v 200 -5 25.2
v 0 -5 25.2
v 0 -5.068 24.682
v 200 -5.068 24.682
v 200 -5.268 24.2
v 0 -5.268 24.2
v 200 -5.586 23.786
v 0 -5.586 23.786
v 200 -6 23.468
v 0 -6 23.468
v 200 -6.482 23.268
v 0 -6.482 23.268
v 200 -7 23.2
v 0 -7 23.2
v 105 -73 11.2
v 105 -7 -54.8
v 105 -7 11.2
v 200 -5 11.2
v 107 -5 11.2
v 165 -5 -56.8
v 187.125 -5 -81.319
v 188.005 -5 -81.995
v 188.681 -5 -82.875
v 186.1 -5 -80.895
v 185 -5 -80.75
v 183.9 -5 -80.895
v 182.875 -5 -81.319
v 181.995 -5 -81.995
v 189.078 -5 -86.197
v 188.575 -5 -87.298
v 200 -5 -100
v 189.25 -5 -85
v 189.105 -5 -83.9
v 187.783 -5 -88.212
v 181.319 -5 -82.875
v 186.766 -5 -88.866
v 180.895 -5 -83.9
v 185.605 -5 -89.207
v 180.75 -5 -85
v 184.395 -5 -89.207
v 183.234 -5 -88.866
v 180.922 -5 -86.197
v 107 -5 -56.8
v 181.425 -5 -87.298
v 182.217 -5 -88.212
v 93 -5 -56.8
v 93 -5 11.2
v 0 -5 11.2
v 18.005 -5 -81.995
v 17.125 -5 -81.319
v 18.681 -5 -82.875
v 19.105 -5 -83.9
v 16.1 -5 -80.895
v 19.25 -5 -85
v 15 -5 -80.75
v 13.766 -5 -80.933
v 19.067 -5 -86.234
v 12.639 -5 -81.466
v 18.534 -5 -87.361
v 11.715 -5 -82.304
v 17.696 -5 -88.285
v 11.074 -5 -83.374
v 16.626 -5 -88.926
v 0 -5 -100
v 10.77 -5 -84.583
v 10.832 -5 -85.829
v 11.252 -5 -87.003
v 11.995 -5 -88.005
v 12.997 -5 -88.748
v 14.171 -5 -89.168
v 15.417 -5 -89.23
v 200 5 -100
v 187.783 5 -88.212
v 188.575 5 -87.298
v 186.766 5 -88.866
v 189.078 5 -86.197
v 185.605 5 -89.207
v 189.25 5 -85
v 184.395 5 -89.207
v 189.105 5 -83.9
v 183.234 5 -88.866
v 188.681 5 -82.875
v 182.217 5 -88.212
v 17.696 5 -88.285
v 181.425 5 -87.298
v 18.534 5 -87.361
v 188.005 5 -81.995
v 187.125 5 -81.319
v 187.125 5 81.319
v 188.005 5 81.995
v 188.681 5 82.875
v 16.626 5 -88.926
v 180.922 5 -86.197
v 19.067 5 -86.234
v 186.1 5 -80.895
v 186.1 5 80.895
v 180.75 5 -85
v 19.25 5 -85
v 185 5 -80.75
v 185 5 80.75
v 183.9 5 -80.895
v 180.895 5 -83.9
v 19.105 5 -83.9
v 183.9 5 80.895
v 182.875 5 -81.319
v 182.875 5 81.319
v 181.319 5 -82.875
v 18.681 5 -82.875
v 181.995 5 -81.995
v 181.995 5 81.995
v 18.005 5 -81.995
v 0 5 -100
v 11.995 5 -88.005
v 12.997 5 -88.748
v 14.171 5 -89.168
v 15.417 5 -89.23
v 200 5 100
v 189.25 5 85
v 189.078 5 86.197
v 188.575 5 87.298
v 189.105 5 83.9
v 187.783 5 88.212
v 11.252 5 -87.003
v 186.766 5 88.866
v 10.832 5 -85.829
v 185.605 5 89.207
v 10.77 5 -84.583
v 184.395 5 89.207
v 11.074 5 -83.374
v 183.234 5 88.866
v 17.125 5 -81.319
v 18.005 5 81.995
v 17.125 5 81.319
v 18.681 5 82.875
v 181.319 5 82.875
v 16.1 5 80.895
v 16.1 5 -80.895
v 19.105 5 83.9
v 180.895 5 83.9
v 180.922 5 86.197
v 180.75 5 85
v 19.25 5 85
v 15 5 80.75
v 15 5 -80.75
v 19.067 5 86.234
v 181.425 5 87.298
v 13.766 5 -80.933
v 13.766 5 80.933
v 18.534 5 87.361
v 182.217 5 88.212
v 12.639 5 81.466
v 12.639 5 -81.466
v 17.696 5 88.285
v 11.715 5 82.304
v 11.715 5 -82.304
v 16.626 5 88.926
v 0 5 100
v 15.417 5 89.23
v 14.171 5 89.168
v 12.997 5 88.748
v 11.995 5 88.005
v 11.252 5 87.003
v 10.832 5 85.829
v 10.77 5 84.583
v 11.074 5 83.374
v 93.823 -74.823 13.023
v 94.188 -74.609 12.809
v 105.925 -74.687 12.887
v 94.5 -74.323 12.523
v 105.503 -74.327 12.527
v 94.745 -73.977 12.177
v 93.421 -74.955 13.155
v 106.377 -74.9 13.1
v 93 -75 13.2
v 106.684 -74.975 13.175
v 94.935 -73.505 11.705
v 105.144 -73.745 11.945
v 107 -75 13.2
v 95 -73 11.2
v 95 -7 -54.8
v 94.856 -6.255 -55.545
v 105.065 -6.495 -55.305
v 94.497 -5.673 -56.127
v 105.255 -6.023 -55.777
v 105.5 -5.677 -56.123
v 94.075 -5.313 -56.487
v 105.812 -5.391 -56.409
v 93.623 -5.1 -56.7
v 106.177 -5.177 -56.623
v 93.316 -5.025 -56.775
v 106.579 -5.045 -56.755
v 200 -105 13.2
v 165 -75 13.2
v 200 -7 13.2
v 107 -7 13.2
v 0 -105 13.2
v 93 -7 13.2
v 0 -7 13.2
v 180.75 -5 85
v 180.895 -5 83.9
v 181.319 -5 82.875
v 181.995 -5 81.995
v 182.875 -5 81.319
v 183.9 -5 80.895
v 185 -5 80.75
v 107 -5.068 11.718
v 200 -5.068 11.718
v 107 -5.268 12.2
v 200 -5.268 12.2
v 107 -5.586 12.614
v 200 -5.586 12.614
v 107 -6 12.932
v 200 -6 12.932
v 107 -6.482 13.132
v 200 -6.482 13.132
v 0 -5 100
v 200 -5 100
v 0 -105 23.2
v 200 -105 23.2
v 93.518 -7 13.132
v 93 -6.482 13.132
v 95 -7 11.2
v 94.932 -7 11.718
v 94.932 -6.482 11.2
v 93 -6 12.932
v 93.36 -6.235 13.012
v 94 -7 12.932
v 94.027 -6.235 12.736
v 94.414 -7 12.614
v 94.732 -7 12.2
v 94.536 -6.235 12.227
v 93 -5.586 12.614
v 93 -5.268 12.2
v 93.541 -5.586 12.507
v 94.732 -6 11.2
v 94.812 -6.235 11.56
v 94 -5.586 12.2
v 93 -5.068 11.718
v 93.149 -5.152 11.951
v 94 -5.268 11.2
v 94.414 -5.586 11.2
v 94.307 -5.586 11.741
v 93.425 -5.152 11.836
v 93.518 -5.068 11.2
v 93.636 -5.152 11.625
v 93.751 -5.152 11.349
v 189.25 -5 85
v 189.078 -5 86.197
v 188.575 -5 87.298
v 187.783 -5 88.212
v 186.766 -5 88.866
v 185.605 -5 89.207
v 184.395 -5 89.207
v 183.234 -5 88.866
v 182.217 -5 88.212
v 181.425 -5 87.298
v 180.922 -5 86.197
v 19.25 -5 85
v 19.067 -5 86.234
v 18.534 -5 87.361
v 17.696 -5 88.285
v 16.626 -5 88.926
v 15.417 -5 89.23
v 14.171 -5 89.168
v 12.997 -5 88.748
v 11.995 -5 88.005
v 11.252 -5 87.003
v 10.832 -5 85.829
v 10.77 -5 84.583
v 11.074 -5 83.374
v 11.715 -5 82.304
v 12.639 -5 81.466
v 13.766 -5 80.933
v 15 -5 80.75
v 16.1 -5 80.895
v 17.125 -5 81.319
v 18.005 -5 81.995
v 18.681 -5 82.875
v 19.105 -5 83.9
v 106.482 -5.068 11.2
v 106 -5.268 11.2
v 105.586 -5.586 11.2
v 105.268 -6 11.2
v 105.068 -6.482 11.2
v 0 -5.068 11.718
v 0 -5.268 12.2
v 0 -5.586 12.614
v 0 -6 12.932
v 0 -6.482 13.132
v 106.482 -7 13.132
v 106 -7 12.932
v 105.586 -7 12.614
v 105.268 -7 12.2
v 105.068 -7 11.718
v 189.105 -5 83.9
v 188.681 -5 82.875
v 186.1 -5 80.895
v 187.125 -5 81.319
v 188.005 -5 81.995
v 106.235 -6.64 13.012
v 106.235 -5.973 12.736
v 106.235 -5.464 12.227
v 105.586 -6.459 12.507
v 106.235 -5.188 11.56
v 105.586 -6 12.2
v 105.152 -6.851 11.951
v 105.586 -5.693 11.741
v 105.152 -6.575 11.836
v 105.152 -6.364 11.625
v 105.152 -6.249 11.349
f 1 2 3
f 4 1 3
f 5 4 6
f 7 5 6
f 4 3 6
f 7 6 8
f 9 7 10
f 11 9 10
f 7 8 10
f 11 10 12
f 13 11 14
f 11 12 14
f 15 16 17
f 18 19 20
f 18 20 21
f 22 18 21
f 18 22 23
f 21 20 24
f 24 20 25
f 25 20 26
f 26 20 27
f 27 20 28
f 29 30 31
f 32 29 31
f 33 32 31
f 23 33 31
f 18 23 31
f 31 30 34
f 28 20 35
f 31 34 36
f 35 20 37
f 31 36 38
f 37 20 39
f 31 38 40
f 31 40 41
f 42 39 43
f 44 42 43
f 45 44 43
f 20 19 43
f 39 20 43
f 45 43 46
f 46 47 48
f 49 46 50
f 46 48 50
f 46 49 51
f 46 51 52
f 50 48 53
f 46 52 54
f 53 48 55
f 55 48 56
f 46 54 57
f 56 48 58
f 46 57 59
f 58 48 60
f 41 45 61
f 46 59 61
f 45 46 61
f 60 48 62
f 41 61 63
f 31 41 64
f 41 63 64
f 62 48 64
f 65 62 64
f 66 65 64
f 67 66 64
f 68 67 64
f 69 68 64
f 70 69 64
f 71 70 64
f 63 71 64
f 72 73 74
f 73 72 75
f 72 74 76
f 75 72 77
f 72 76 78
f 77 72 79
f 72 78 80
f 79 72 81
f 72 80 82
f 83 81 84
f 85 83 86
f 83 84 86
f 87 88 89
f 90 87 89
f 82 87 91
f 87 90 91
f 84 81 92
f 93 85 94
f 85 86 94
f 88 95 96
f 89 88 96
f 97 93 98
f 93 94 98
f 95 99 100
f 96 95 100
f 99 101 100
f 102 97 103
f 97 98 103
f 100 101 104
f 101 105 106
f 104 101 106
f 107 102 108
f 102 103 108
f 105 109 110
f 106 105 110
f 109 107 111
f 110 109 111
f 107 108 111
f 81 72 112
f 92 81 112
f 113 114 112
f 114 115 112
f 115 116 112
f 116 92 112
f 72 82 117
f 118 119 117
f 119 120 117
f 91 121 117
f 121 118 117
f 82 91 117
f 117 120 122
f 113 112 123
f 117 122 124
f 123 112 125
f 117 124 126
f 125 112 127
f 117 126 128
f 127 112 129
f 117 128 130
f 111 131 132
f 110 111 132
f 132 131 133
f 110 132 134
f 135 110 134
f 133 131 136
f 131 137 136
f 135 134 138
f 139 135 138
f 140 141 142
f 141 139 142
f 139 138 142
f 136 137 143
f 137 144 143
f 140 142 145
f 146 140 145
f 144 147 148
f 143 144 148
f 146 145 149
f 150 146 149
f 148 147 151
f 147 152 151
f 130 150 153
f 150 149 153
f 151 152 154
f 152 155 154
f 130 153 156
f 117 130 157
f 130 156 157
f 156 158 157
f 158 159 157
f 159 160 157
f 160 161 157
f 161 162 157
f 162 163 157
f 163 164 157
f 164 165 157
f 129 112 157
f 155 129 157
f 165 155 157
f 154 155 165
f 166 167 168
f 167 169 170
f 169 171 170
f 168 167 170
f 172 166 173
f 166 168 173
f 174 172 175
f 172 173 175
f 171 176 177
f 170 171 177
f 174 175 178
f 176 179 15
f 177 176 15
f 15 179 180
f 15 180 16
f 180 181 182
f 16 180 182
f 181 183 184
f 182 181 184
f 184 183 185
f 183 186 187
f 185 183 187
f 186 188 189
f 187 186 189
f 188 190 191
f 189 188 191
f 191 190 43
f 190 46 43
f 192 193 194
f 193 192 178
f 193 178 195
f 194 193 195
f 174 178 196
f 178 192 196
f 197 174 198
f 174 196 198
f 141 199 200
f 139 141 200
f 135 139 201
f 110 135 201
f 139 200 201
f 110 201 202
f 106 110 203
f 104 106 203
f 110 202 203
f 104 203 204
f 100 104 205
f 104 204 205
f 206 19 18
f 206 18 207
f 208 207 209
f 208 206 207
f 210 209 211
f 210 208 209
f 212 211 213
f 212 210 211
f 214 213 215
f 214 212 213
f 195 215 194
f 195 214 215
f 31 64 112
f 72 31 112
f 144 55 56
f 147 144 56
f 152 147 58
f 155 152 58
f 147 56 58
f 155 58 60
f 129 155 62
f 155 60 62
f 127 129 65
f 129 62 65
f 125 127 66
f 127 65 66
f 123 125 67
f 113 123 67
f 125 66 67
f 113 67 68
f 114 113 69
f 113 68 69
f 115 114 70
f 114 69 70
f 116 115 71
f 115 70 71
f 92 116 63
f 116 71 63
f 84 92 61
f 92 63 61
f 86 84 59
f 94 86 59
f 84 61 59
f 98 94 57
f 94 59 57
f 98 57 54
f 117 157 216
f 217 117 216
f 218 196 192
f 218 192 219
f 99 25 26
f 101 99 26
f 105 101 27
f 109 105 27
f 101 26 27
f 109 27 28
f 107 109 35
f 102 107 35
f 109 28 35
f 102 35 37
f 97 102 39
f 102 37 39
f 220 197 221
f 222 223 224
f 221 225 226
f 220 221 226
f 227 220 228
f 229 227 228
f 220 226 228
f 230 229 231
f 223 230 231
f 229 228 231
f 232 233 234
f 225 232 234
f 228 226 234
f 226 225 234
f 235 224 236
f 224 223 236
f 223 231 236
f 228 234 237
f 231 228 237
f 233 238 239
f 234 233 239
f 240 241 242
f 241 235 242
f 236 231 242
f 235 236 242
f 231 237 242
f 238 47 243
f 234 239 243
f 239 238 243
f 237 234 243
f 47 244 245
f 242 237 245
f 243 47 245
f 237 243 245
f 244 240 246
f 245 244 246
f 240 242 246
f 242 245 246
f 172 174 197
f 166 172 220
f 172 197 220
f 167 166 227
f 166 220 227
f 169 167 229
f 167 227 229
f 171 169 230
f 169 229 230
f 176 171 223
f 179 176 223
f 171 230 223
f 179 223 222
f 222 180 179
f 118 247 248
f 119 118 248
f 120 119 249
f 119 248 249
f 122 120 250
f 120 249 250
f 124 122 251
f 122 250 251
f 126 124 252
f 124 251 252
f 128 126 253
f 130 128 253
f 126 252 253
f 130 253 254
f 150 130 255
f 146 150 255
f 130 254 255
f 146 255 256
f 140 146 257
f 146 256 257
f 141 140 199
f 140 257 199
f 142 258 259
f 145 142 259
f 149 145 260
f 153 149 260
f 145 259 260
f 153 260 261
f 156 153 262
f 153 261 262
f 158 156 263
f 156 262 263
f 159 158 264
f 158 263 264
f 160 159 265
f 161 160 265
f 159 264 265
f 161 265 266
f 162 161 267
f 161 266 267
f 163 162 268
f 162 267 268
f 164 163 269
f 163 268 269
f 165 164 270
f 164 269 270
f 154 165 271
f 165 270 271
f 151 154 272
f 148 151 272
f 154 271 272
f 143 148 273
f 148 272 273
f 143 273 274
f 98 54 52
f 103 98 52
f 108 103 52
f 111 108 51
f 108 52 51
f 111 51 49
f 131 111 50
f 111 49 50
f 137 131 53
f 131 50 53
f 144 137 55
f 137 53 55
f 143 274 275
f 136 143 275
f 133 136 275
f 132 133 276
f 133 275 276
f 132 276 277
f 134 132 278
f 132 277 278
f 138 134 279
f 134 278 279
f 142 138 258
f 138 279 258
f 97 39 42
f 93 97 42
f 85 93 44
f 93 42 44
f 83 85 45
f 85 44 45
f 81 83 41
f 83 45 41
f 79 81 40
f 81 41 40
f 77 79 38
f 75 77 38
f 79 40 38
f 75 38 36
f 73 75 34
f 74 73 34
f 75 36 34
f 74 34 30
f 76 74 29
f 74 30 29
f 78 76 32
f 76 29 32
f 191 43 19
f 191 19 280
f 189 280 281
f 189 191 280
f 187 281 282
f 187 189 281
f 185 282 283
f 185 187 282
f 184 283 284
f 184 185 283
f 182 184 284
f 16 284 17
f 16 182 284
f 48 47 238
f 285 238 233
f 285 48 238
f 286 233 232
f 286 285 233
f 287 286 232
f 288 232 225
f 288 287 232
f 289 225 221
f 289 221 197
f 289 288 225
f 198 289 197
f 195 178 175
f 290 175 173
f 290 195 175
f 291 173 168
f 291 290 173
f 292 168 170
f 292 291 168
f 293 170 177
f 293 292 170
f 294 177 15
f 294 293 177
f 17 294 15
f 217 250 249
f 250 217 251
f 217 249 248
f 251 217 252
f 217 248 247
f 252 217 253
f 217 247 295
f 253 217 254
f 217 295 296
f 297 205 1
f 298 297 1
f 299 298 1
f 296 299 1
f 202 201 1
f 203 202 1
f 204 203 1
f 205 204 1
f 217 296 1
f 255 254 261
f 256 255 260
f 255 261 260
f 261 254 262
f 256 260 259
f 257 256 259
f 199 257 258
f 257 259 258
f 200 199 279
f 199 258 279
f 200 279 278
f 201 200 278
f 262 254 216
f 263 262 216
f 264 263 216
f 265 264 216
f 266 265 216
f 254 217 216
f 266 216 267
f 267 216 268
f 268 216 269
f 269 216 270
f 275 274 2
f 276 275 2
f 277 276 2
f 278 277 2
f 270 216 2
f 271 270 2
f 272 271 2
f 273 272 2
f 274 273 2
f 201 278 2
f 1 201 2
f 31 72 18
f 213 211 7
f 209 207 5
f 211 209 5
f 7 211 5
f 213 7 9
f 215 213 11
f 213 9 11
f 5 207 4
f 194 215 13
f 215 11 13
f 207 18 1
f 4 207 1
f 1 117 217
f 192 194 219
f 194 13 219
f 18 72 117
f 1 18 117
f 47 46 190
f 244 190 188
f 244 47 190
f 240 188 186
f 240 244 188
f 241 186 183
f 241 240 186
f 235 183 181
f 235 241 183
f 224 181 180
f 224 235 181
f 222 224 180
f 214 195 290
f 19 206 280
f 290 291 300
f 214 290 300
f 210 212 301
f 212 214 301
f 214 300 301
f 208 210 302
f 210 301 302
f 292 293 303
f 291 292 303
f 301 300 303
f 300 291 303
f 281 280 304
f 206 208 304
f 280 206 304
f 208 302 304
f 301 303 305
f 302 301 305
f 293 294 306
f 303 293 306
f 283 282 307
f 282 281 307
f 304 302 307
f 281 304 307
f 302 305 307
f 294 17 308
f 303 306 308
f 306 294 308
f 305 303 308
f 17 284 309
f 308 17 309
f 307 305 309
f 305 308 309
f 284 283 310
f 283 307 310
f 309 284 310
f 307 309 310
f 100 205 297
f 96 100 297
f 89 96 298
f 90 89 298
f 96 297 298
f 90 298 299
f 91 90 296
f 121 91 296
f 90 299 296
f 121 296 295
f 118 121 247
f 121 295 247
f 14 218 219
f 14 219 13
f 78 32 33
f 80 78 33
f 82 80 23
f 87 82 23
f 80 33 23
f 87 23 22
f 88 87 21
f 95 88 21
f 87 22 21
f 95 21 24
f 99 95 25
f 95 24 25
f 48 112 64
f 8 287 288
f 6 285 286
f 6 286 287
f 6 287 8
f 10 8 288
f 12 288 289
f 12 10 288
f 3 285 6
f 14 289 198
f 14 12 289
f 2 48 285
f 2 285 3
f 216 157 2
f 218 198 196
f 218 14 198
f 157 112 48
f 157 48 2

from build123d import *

# Parameters (mm, degrees)
F0_W         = 100
F0_H         = 10
F1_DEPTH     = 200
F2_W         = 10
F2_H         = 70
F3_DEPTH     = 70
F5_DEPTH     = 70
F7_DEPTH     = 20
F8_T1_DEPTH  = 200
F8_T3_DEPTH  = 93
F8_T5_DEPTH  = 93
F8_S9_W      = 2
F8_S9_H      = 2
F8_T10_DEPTH = 2
F8_S15_W     = 2
F8_S15_H     = 2
F8_T16_DEPTH = 2
F8_T22_DEPTH = 73
F8_T27_DEPTH = 73
F8_T32_DEPTH = 73
F8_T37_DEPTH = 73


# Not quite as in the source:
# - a fillet or chamfer that OpenCascade refuses, or shapes differently, is made with other operations: its cross-section is extruded or revolved along the edge and cut away or added


with BuildPart() as f1:
    # F0 (on Right) → F1 (new body)
    with BuildSketch(Plane.YZ):
        Polygon((5, -100), (5, 100), (-5, 100), (-5, 23.2), (-5, 13.2), (-5, -100), align=None)
        with Locations((-55, 18.2)):
            Rectangle(F0_W, F0_H)
    extrude(amount=F1_DEPTH)

    # F2 (on face) → F3 (join)
    with BuildSketch(Plane.XZ.offset(5)):
        with Locations((100, -21.8)):
            Rectangle(F2_W, F2_H)
    extrude(amount=F3_DEPTH)

    # F4 (on face) → F5 (cut)
    with BuildSketch(Plane(origin=(95, 0, 0), x_dir=(0, -1, 0), z_dir=(-1, 0, 0))):
        Polygon((75, -56.8), (75, 13.2), (5, -56.8), align=None)
    extrude(amount=-F5_DEPTH, mode=Mode.SUBTRACT)

    # F6 (on face) → F7 (cut)
    with BuildSketch(Plane.XZ.offset(5)):
        with BuildLine():
            Line((15, 80.75), (15, 85))
            Line((15, 85), (19.25, 85))
            ThreePointArc((19.25, 85), (11.99479618, 88.00520382), (15, 80.75))
        make_face()
        with BuildLine():
            Line((19.25, 85), (15, 85))
            Line((15, 85), (15, 80.75))
            ThreePointArc((15, 80.75), (18.00520382, 81.99479618), (19.25, 85))
        make_face()
        with BuildLine():
            ThreePointArc((189.25, 85), (185, 89.25), (180.75, 85))
            Line((180.75, 85), (185, 85))
            Line((185, 85), (185, 80.75))
            ThreePointArc((185, 80.75), (188.00520382, 81.99479618), (189.25, 85))
        make_face()
        with BuildLine():
            Line((185, 85), (180.75, 85))
            ThreePointArc((180.75, 85), (181.99479618, 81.99479618), (185, 80.75))
            Line((185, 80.75), (185, 85))
        make_face()
        with BuildLine():
            ThreePointArc((189.25, -85), (188.00520382, -81.99479618), (185, -80.75))
            Line((185, -80.75), (185, -85))
            Line((185, -85), (180.75, -85))
            ThreePointArc((180.75, -85), (185, -89.25), (189.25, -85))
        make_face()
        with BuildLine():
            Line((185, -85), (185, -80.75))
            ThreePointArc((185, -80.75), (181.99479618, -81.99479618), (180.75, -85))
            Line((180.75, -85), (185, -85))
        make_face()
        with BuildLine():
            Line((15, -85), (15, -80.75))
            ThreePointArc((15, -80.75), (11.99479618, -88.00520382), (19.25, -85))
            Line((19.25, -85), (15, -85))
        make_face()
        with BuildLine():
            ThreePointArc((19.25, -85), (18.00520382, -81.99479618), (15, -80.75))
            Line((15, -80.75), (15, -85))
            Line((15, -85), (19.25, -85))
        make_face()
    extrude(amount=-F7_DEPTH, mode=Mode.SUBTRACT)

    # F8: fillet of radius 2 on 7 edges, made by hand

    # F8_s2 → F8_t1 (join)
    with BuildSketch(Plane.YZ):
        with BuildLine():
            ThreePointArc((-5, 25.2), (-5.5857864376, 23.7857864376), (-7, 23.2))
            Line((-7, 23.2), (-5, 23.2))
            Line((-5, 23.2), (-5, 25.2))
        make_face()
    extrude(amount=F8_T1_DEPTH)

    # F8_s4 → F8_t3 (join)
    with BuildSketch(Plane.YZ):
        with BuildLine():
            ThreePointArc((-5, 11.2), (-5.5857864376, 12.6142135624), (-7, 13.2))
            Line((-7, 13.2), (-5, 13.2))
            Line((-5, 13.2), (-5, 11.2))
        make_face()
    extrude(amount=F8_T3_DEPTH)

    # F8_s6 → F8_t5 (join)
    with BuildSketch(Plane.YZ.offset(107)):
        with BuildLine():
            ThreePointArc((-5, 11.2), (-5.5857864376, 12.6142135624), (-7, 13.2))
            Line((-7, 13.2), (-5, 13.2))
            Line((-5, 13.2), (-5, 11.2))
        make_face()
    extrude(amount=F8_T5_DEPTH)


with BuildPart() as f8_tool8:
    # F8_s9 → F8_t10 (new body)
    with BuildSketch(Plane.XZ.offset(7)):
        with Locations((94, 12.2)):
            Rectangle(F8_S9_W, F8_S9_H)
    extrude(amount=-F8_T10_DEPTH)

    # F8_s11 → F8_t12 (revolve, cut)
    with BuildSketch(Plane(origin=(93, -7, 11.2), x_dir=(-0.7071067812, 0, -0.7071067812), z_dir=(0.7071067812, 0, -0.7071067812))):
        with BuildLine():
            ThreePointArc((0, -2), (2, 0), (0, 2))
            Line((0, 2), (0, -2))
        make_face()
    revolve(axis=Axis((93, -7, 11.2), (0, 1, 0)), mode=Mode.SUBTRACT)


with BuildPart() as f1_1:
    add(f1.part)

    # F8_t7: union F8_tool8
    add(f8_tool8.part)


with BuildPart() as f8_tool14:
    # F8_s15 → F8_t16 (new body)
    with BuildSketch(Plane.YZ.offset(107)):
        with Locations((-6, 12.2)):
            Rectangle(F8_S15_W, F8_S15_H)
    extrude(amount=-F8_T16_DEPTH)

    # F8_s17 → F8_t18 (revolve, cut)
    with BuildSketch(Plane(origin=(107, -7, 11.2), x_dir=(0, -0.7071067812, -0.7071067812), z_dir=(0, 0.7071067812, -0.7071067812))):
        with BuildLine():
            ThreePointArc((0, -2), (2, 0), (0, 2))
            Line((0, 2), (0, -2))
        make_face()
    revolve(axis=Axis((107, -7, 11.2), (-1, 0, 0)), mode=Mode.SUBTRACT)


with BuildPart() as f1_2:
    add(f1_1.part)

    # F8_t13: union F8_tool14
    add(f8_tool14.part)


with BuildPart() as f8_tool20:
    # F8_s21 → F8_t22 (new body)
    with BuildSketch(Plane.XY.offset(-61.8)):
        with BuildLine():
            ThreePointArc((107, -5), (105.5857864376, -5.5857864376), (105, -7))
            Line((105, -7), (105, -5))
            Line((105, -5), (107, -5))
        make_face()
    extrude(amount=F8_T22_DEPTH)

    split(bisect_by=Plane(origin=(0, -30.9, -30.9), x_dir=(1, 0, 0), z_dir=(0, 0.7071067812, 0.7071067812)), keep=Keep.TOP)


with BuildPart() as f1_3:
    add(f1_2.part)

    # F8_t19: union F8_tool20
    add(f8_tool20.part)


with BuildPart() as f8_tool25:
    # F8_s26 → F8_t27 (new body)
    with BuildSketch(Plane.XY.offset(11.2)):
        with BuildLine():
            ThreePointArc((93, -5), (94.4142135624, -5.5857864376), (95, -7))
            Line((95, -7), (95, -5))
            Line((95, -5), (93, -5))
        make_face()
    extrude(amount=-F8_T27_DEPTH)

    split(bisect_by=Plane(origin=(0, -30.9, -30.9), x_dir=(1, 0, 0), z_dir=(0, 0.7071067812, 0.7071067812)), keep=Keep.TOP)


with BuildPart() as f1_4:
    add(f1_3.part)

    # F8_t24: union F8_tool25
    add(f8_tool25.part)


with BuildPart() as f8_tool30:
    # F8_s31 → F8_t32 (new body)
    with BuildSketch(Plane.XZ.offset(7)):
        with BuildLine():
            ThreePointArc((93, 13.2), (94.4142135624, 12.6142135624), (95, 11.2))
            Line((95, 11.2), (95, 13.2))
            Line((95, 13.2), (93, 13.2))
        make_face()
    extrude(amount=F8_T32_DEPTH)

    split(bisect_by=Plane(origin=(0, -30.9, -30.9), x_dir=(1, 0, 0), z_dir=(0, 0.7071067812, 0.7071067812)), keep=Keep.TOP)


with BuildPart() as f1_5:
    add(f1_4.part)

    # F8_t29: union F8_tool30
    add(f8_tool30.part)


with BuildPart() as f8_tool35:
    # F8_s36 → F8_t37 (new body)
    with BuildSketch(Plane.XZ.offset(7)):
        with BuildLine():
            ThreePointArc((107, 13.2), (105.5857864376, 12.6142135624), (105, 11.2))
            Line((105, 11.2), (105, 13.2))
            Line((105, 13.2), (107, 13.2))
        make_face()
    extrude(amount=F8_T37_DEPTH)

    split(bisect_by=Plane(origin=(0, -30.9, -30.9), x_dir=(1, 0, 0), z_dir=(0, 0.7071067812, 0.7071067812)), keep=Keep.TOP)


with BuildPart() as f1_6:
    add(f1_5.part)

    # F8_t34: union F8_tool35
    add(f8_tool35.part)


solid = f1_6.part
